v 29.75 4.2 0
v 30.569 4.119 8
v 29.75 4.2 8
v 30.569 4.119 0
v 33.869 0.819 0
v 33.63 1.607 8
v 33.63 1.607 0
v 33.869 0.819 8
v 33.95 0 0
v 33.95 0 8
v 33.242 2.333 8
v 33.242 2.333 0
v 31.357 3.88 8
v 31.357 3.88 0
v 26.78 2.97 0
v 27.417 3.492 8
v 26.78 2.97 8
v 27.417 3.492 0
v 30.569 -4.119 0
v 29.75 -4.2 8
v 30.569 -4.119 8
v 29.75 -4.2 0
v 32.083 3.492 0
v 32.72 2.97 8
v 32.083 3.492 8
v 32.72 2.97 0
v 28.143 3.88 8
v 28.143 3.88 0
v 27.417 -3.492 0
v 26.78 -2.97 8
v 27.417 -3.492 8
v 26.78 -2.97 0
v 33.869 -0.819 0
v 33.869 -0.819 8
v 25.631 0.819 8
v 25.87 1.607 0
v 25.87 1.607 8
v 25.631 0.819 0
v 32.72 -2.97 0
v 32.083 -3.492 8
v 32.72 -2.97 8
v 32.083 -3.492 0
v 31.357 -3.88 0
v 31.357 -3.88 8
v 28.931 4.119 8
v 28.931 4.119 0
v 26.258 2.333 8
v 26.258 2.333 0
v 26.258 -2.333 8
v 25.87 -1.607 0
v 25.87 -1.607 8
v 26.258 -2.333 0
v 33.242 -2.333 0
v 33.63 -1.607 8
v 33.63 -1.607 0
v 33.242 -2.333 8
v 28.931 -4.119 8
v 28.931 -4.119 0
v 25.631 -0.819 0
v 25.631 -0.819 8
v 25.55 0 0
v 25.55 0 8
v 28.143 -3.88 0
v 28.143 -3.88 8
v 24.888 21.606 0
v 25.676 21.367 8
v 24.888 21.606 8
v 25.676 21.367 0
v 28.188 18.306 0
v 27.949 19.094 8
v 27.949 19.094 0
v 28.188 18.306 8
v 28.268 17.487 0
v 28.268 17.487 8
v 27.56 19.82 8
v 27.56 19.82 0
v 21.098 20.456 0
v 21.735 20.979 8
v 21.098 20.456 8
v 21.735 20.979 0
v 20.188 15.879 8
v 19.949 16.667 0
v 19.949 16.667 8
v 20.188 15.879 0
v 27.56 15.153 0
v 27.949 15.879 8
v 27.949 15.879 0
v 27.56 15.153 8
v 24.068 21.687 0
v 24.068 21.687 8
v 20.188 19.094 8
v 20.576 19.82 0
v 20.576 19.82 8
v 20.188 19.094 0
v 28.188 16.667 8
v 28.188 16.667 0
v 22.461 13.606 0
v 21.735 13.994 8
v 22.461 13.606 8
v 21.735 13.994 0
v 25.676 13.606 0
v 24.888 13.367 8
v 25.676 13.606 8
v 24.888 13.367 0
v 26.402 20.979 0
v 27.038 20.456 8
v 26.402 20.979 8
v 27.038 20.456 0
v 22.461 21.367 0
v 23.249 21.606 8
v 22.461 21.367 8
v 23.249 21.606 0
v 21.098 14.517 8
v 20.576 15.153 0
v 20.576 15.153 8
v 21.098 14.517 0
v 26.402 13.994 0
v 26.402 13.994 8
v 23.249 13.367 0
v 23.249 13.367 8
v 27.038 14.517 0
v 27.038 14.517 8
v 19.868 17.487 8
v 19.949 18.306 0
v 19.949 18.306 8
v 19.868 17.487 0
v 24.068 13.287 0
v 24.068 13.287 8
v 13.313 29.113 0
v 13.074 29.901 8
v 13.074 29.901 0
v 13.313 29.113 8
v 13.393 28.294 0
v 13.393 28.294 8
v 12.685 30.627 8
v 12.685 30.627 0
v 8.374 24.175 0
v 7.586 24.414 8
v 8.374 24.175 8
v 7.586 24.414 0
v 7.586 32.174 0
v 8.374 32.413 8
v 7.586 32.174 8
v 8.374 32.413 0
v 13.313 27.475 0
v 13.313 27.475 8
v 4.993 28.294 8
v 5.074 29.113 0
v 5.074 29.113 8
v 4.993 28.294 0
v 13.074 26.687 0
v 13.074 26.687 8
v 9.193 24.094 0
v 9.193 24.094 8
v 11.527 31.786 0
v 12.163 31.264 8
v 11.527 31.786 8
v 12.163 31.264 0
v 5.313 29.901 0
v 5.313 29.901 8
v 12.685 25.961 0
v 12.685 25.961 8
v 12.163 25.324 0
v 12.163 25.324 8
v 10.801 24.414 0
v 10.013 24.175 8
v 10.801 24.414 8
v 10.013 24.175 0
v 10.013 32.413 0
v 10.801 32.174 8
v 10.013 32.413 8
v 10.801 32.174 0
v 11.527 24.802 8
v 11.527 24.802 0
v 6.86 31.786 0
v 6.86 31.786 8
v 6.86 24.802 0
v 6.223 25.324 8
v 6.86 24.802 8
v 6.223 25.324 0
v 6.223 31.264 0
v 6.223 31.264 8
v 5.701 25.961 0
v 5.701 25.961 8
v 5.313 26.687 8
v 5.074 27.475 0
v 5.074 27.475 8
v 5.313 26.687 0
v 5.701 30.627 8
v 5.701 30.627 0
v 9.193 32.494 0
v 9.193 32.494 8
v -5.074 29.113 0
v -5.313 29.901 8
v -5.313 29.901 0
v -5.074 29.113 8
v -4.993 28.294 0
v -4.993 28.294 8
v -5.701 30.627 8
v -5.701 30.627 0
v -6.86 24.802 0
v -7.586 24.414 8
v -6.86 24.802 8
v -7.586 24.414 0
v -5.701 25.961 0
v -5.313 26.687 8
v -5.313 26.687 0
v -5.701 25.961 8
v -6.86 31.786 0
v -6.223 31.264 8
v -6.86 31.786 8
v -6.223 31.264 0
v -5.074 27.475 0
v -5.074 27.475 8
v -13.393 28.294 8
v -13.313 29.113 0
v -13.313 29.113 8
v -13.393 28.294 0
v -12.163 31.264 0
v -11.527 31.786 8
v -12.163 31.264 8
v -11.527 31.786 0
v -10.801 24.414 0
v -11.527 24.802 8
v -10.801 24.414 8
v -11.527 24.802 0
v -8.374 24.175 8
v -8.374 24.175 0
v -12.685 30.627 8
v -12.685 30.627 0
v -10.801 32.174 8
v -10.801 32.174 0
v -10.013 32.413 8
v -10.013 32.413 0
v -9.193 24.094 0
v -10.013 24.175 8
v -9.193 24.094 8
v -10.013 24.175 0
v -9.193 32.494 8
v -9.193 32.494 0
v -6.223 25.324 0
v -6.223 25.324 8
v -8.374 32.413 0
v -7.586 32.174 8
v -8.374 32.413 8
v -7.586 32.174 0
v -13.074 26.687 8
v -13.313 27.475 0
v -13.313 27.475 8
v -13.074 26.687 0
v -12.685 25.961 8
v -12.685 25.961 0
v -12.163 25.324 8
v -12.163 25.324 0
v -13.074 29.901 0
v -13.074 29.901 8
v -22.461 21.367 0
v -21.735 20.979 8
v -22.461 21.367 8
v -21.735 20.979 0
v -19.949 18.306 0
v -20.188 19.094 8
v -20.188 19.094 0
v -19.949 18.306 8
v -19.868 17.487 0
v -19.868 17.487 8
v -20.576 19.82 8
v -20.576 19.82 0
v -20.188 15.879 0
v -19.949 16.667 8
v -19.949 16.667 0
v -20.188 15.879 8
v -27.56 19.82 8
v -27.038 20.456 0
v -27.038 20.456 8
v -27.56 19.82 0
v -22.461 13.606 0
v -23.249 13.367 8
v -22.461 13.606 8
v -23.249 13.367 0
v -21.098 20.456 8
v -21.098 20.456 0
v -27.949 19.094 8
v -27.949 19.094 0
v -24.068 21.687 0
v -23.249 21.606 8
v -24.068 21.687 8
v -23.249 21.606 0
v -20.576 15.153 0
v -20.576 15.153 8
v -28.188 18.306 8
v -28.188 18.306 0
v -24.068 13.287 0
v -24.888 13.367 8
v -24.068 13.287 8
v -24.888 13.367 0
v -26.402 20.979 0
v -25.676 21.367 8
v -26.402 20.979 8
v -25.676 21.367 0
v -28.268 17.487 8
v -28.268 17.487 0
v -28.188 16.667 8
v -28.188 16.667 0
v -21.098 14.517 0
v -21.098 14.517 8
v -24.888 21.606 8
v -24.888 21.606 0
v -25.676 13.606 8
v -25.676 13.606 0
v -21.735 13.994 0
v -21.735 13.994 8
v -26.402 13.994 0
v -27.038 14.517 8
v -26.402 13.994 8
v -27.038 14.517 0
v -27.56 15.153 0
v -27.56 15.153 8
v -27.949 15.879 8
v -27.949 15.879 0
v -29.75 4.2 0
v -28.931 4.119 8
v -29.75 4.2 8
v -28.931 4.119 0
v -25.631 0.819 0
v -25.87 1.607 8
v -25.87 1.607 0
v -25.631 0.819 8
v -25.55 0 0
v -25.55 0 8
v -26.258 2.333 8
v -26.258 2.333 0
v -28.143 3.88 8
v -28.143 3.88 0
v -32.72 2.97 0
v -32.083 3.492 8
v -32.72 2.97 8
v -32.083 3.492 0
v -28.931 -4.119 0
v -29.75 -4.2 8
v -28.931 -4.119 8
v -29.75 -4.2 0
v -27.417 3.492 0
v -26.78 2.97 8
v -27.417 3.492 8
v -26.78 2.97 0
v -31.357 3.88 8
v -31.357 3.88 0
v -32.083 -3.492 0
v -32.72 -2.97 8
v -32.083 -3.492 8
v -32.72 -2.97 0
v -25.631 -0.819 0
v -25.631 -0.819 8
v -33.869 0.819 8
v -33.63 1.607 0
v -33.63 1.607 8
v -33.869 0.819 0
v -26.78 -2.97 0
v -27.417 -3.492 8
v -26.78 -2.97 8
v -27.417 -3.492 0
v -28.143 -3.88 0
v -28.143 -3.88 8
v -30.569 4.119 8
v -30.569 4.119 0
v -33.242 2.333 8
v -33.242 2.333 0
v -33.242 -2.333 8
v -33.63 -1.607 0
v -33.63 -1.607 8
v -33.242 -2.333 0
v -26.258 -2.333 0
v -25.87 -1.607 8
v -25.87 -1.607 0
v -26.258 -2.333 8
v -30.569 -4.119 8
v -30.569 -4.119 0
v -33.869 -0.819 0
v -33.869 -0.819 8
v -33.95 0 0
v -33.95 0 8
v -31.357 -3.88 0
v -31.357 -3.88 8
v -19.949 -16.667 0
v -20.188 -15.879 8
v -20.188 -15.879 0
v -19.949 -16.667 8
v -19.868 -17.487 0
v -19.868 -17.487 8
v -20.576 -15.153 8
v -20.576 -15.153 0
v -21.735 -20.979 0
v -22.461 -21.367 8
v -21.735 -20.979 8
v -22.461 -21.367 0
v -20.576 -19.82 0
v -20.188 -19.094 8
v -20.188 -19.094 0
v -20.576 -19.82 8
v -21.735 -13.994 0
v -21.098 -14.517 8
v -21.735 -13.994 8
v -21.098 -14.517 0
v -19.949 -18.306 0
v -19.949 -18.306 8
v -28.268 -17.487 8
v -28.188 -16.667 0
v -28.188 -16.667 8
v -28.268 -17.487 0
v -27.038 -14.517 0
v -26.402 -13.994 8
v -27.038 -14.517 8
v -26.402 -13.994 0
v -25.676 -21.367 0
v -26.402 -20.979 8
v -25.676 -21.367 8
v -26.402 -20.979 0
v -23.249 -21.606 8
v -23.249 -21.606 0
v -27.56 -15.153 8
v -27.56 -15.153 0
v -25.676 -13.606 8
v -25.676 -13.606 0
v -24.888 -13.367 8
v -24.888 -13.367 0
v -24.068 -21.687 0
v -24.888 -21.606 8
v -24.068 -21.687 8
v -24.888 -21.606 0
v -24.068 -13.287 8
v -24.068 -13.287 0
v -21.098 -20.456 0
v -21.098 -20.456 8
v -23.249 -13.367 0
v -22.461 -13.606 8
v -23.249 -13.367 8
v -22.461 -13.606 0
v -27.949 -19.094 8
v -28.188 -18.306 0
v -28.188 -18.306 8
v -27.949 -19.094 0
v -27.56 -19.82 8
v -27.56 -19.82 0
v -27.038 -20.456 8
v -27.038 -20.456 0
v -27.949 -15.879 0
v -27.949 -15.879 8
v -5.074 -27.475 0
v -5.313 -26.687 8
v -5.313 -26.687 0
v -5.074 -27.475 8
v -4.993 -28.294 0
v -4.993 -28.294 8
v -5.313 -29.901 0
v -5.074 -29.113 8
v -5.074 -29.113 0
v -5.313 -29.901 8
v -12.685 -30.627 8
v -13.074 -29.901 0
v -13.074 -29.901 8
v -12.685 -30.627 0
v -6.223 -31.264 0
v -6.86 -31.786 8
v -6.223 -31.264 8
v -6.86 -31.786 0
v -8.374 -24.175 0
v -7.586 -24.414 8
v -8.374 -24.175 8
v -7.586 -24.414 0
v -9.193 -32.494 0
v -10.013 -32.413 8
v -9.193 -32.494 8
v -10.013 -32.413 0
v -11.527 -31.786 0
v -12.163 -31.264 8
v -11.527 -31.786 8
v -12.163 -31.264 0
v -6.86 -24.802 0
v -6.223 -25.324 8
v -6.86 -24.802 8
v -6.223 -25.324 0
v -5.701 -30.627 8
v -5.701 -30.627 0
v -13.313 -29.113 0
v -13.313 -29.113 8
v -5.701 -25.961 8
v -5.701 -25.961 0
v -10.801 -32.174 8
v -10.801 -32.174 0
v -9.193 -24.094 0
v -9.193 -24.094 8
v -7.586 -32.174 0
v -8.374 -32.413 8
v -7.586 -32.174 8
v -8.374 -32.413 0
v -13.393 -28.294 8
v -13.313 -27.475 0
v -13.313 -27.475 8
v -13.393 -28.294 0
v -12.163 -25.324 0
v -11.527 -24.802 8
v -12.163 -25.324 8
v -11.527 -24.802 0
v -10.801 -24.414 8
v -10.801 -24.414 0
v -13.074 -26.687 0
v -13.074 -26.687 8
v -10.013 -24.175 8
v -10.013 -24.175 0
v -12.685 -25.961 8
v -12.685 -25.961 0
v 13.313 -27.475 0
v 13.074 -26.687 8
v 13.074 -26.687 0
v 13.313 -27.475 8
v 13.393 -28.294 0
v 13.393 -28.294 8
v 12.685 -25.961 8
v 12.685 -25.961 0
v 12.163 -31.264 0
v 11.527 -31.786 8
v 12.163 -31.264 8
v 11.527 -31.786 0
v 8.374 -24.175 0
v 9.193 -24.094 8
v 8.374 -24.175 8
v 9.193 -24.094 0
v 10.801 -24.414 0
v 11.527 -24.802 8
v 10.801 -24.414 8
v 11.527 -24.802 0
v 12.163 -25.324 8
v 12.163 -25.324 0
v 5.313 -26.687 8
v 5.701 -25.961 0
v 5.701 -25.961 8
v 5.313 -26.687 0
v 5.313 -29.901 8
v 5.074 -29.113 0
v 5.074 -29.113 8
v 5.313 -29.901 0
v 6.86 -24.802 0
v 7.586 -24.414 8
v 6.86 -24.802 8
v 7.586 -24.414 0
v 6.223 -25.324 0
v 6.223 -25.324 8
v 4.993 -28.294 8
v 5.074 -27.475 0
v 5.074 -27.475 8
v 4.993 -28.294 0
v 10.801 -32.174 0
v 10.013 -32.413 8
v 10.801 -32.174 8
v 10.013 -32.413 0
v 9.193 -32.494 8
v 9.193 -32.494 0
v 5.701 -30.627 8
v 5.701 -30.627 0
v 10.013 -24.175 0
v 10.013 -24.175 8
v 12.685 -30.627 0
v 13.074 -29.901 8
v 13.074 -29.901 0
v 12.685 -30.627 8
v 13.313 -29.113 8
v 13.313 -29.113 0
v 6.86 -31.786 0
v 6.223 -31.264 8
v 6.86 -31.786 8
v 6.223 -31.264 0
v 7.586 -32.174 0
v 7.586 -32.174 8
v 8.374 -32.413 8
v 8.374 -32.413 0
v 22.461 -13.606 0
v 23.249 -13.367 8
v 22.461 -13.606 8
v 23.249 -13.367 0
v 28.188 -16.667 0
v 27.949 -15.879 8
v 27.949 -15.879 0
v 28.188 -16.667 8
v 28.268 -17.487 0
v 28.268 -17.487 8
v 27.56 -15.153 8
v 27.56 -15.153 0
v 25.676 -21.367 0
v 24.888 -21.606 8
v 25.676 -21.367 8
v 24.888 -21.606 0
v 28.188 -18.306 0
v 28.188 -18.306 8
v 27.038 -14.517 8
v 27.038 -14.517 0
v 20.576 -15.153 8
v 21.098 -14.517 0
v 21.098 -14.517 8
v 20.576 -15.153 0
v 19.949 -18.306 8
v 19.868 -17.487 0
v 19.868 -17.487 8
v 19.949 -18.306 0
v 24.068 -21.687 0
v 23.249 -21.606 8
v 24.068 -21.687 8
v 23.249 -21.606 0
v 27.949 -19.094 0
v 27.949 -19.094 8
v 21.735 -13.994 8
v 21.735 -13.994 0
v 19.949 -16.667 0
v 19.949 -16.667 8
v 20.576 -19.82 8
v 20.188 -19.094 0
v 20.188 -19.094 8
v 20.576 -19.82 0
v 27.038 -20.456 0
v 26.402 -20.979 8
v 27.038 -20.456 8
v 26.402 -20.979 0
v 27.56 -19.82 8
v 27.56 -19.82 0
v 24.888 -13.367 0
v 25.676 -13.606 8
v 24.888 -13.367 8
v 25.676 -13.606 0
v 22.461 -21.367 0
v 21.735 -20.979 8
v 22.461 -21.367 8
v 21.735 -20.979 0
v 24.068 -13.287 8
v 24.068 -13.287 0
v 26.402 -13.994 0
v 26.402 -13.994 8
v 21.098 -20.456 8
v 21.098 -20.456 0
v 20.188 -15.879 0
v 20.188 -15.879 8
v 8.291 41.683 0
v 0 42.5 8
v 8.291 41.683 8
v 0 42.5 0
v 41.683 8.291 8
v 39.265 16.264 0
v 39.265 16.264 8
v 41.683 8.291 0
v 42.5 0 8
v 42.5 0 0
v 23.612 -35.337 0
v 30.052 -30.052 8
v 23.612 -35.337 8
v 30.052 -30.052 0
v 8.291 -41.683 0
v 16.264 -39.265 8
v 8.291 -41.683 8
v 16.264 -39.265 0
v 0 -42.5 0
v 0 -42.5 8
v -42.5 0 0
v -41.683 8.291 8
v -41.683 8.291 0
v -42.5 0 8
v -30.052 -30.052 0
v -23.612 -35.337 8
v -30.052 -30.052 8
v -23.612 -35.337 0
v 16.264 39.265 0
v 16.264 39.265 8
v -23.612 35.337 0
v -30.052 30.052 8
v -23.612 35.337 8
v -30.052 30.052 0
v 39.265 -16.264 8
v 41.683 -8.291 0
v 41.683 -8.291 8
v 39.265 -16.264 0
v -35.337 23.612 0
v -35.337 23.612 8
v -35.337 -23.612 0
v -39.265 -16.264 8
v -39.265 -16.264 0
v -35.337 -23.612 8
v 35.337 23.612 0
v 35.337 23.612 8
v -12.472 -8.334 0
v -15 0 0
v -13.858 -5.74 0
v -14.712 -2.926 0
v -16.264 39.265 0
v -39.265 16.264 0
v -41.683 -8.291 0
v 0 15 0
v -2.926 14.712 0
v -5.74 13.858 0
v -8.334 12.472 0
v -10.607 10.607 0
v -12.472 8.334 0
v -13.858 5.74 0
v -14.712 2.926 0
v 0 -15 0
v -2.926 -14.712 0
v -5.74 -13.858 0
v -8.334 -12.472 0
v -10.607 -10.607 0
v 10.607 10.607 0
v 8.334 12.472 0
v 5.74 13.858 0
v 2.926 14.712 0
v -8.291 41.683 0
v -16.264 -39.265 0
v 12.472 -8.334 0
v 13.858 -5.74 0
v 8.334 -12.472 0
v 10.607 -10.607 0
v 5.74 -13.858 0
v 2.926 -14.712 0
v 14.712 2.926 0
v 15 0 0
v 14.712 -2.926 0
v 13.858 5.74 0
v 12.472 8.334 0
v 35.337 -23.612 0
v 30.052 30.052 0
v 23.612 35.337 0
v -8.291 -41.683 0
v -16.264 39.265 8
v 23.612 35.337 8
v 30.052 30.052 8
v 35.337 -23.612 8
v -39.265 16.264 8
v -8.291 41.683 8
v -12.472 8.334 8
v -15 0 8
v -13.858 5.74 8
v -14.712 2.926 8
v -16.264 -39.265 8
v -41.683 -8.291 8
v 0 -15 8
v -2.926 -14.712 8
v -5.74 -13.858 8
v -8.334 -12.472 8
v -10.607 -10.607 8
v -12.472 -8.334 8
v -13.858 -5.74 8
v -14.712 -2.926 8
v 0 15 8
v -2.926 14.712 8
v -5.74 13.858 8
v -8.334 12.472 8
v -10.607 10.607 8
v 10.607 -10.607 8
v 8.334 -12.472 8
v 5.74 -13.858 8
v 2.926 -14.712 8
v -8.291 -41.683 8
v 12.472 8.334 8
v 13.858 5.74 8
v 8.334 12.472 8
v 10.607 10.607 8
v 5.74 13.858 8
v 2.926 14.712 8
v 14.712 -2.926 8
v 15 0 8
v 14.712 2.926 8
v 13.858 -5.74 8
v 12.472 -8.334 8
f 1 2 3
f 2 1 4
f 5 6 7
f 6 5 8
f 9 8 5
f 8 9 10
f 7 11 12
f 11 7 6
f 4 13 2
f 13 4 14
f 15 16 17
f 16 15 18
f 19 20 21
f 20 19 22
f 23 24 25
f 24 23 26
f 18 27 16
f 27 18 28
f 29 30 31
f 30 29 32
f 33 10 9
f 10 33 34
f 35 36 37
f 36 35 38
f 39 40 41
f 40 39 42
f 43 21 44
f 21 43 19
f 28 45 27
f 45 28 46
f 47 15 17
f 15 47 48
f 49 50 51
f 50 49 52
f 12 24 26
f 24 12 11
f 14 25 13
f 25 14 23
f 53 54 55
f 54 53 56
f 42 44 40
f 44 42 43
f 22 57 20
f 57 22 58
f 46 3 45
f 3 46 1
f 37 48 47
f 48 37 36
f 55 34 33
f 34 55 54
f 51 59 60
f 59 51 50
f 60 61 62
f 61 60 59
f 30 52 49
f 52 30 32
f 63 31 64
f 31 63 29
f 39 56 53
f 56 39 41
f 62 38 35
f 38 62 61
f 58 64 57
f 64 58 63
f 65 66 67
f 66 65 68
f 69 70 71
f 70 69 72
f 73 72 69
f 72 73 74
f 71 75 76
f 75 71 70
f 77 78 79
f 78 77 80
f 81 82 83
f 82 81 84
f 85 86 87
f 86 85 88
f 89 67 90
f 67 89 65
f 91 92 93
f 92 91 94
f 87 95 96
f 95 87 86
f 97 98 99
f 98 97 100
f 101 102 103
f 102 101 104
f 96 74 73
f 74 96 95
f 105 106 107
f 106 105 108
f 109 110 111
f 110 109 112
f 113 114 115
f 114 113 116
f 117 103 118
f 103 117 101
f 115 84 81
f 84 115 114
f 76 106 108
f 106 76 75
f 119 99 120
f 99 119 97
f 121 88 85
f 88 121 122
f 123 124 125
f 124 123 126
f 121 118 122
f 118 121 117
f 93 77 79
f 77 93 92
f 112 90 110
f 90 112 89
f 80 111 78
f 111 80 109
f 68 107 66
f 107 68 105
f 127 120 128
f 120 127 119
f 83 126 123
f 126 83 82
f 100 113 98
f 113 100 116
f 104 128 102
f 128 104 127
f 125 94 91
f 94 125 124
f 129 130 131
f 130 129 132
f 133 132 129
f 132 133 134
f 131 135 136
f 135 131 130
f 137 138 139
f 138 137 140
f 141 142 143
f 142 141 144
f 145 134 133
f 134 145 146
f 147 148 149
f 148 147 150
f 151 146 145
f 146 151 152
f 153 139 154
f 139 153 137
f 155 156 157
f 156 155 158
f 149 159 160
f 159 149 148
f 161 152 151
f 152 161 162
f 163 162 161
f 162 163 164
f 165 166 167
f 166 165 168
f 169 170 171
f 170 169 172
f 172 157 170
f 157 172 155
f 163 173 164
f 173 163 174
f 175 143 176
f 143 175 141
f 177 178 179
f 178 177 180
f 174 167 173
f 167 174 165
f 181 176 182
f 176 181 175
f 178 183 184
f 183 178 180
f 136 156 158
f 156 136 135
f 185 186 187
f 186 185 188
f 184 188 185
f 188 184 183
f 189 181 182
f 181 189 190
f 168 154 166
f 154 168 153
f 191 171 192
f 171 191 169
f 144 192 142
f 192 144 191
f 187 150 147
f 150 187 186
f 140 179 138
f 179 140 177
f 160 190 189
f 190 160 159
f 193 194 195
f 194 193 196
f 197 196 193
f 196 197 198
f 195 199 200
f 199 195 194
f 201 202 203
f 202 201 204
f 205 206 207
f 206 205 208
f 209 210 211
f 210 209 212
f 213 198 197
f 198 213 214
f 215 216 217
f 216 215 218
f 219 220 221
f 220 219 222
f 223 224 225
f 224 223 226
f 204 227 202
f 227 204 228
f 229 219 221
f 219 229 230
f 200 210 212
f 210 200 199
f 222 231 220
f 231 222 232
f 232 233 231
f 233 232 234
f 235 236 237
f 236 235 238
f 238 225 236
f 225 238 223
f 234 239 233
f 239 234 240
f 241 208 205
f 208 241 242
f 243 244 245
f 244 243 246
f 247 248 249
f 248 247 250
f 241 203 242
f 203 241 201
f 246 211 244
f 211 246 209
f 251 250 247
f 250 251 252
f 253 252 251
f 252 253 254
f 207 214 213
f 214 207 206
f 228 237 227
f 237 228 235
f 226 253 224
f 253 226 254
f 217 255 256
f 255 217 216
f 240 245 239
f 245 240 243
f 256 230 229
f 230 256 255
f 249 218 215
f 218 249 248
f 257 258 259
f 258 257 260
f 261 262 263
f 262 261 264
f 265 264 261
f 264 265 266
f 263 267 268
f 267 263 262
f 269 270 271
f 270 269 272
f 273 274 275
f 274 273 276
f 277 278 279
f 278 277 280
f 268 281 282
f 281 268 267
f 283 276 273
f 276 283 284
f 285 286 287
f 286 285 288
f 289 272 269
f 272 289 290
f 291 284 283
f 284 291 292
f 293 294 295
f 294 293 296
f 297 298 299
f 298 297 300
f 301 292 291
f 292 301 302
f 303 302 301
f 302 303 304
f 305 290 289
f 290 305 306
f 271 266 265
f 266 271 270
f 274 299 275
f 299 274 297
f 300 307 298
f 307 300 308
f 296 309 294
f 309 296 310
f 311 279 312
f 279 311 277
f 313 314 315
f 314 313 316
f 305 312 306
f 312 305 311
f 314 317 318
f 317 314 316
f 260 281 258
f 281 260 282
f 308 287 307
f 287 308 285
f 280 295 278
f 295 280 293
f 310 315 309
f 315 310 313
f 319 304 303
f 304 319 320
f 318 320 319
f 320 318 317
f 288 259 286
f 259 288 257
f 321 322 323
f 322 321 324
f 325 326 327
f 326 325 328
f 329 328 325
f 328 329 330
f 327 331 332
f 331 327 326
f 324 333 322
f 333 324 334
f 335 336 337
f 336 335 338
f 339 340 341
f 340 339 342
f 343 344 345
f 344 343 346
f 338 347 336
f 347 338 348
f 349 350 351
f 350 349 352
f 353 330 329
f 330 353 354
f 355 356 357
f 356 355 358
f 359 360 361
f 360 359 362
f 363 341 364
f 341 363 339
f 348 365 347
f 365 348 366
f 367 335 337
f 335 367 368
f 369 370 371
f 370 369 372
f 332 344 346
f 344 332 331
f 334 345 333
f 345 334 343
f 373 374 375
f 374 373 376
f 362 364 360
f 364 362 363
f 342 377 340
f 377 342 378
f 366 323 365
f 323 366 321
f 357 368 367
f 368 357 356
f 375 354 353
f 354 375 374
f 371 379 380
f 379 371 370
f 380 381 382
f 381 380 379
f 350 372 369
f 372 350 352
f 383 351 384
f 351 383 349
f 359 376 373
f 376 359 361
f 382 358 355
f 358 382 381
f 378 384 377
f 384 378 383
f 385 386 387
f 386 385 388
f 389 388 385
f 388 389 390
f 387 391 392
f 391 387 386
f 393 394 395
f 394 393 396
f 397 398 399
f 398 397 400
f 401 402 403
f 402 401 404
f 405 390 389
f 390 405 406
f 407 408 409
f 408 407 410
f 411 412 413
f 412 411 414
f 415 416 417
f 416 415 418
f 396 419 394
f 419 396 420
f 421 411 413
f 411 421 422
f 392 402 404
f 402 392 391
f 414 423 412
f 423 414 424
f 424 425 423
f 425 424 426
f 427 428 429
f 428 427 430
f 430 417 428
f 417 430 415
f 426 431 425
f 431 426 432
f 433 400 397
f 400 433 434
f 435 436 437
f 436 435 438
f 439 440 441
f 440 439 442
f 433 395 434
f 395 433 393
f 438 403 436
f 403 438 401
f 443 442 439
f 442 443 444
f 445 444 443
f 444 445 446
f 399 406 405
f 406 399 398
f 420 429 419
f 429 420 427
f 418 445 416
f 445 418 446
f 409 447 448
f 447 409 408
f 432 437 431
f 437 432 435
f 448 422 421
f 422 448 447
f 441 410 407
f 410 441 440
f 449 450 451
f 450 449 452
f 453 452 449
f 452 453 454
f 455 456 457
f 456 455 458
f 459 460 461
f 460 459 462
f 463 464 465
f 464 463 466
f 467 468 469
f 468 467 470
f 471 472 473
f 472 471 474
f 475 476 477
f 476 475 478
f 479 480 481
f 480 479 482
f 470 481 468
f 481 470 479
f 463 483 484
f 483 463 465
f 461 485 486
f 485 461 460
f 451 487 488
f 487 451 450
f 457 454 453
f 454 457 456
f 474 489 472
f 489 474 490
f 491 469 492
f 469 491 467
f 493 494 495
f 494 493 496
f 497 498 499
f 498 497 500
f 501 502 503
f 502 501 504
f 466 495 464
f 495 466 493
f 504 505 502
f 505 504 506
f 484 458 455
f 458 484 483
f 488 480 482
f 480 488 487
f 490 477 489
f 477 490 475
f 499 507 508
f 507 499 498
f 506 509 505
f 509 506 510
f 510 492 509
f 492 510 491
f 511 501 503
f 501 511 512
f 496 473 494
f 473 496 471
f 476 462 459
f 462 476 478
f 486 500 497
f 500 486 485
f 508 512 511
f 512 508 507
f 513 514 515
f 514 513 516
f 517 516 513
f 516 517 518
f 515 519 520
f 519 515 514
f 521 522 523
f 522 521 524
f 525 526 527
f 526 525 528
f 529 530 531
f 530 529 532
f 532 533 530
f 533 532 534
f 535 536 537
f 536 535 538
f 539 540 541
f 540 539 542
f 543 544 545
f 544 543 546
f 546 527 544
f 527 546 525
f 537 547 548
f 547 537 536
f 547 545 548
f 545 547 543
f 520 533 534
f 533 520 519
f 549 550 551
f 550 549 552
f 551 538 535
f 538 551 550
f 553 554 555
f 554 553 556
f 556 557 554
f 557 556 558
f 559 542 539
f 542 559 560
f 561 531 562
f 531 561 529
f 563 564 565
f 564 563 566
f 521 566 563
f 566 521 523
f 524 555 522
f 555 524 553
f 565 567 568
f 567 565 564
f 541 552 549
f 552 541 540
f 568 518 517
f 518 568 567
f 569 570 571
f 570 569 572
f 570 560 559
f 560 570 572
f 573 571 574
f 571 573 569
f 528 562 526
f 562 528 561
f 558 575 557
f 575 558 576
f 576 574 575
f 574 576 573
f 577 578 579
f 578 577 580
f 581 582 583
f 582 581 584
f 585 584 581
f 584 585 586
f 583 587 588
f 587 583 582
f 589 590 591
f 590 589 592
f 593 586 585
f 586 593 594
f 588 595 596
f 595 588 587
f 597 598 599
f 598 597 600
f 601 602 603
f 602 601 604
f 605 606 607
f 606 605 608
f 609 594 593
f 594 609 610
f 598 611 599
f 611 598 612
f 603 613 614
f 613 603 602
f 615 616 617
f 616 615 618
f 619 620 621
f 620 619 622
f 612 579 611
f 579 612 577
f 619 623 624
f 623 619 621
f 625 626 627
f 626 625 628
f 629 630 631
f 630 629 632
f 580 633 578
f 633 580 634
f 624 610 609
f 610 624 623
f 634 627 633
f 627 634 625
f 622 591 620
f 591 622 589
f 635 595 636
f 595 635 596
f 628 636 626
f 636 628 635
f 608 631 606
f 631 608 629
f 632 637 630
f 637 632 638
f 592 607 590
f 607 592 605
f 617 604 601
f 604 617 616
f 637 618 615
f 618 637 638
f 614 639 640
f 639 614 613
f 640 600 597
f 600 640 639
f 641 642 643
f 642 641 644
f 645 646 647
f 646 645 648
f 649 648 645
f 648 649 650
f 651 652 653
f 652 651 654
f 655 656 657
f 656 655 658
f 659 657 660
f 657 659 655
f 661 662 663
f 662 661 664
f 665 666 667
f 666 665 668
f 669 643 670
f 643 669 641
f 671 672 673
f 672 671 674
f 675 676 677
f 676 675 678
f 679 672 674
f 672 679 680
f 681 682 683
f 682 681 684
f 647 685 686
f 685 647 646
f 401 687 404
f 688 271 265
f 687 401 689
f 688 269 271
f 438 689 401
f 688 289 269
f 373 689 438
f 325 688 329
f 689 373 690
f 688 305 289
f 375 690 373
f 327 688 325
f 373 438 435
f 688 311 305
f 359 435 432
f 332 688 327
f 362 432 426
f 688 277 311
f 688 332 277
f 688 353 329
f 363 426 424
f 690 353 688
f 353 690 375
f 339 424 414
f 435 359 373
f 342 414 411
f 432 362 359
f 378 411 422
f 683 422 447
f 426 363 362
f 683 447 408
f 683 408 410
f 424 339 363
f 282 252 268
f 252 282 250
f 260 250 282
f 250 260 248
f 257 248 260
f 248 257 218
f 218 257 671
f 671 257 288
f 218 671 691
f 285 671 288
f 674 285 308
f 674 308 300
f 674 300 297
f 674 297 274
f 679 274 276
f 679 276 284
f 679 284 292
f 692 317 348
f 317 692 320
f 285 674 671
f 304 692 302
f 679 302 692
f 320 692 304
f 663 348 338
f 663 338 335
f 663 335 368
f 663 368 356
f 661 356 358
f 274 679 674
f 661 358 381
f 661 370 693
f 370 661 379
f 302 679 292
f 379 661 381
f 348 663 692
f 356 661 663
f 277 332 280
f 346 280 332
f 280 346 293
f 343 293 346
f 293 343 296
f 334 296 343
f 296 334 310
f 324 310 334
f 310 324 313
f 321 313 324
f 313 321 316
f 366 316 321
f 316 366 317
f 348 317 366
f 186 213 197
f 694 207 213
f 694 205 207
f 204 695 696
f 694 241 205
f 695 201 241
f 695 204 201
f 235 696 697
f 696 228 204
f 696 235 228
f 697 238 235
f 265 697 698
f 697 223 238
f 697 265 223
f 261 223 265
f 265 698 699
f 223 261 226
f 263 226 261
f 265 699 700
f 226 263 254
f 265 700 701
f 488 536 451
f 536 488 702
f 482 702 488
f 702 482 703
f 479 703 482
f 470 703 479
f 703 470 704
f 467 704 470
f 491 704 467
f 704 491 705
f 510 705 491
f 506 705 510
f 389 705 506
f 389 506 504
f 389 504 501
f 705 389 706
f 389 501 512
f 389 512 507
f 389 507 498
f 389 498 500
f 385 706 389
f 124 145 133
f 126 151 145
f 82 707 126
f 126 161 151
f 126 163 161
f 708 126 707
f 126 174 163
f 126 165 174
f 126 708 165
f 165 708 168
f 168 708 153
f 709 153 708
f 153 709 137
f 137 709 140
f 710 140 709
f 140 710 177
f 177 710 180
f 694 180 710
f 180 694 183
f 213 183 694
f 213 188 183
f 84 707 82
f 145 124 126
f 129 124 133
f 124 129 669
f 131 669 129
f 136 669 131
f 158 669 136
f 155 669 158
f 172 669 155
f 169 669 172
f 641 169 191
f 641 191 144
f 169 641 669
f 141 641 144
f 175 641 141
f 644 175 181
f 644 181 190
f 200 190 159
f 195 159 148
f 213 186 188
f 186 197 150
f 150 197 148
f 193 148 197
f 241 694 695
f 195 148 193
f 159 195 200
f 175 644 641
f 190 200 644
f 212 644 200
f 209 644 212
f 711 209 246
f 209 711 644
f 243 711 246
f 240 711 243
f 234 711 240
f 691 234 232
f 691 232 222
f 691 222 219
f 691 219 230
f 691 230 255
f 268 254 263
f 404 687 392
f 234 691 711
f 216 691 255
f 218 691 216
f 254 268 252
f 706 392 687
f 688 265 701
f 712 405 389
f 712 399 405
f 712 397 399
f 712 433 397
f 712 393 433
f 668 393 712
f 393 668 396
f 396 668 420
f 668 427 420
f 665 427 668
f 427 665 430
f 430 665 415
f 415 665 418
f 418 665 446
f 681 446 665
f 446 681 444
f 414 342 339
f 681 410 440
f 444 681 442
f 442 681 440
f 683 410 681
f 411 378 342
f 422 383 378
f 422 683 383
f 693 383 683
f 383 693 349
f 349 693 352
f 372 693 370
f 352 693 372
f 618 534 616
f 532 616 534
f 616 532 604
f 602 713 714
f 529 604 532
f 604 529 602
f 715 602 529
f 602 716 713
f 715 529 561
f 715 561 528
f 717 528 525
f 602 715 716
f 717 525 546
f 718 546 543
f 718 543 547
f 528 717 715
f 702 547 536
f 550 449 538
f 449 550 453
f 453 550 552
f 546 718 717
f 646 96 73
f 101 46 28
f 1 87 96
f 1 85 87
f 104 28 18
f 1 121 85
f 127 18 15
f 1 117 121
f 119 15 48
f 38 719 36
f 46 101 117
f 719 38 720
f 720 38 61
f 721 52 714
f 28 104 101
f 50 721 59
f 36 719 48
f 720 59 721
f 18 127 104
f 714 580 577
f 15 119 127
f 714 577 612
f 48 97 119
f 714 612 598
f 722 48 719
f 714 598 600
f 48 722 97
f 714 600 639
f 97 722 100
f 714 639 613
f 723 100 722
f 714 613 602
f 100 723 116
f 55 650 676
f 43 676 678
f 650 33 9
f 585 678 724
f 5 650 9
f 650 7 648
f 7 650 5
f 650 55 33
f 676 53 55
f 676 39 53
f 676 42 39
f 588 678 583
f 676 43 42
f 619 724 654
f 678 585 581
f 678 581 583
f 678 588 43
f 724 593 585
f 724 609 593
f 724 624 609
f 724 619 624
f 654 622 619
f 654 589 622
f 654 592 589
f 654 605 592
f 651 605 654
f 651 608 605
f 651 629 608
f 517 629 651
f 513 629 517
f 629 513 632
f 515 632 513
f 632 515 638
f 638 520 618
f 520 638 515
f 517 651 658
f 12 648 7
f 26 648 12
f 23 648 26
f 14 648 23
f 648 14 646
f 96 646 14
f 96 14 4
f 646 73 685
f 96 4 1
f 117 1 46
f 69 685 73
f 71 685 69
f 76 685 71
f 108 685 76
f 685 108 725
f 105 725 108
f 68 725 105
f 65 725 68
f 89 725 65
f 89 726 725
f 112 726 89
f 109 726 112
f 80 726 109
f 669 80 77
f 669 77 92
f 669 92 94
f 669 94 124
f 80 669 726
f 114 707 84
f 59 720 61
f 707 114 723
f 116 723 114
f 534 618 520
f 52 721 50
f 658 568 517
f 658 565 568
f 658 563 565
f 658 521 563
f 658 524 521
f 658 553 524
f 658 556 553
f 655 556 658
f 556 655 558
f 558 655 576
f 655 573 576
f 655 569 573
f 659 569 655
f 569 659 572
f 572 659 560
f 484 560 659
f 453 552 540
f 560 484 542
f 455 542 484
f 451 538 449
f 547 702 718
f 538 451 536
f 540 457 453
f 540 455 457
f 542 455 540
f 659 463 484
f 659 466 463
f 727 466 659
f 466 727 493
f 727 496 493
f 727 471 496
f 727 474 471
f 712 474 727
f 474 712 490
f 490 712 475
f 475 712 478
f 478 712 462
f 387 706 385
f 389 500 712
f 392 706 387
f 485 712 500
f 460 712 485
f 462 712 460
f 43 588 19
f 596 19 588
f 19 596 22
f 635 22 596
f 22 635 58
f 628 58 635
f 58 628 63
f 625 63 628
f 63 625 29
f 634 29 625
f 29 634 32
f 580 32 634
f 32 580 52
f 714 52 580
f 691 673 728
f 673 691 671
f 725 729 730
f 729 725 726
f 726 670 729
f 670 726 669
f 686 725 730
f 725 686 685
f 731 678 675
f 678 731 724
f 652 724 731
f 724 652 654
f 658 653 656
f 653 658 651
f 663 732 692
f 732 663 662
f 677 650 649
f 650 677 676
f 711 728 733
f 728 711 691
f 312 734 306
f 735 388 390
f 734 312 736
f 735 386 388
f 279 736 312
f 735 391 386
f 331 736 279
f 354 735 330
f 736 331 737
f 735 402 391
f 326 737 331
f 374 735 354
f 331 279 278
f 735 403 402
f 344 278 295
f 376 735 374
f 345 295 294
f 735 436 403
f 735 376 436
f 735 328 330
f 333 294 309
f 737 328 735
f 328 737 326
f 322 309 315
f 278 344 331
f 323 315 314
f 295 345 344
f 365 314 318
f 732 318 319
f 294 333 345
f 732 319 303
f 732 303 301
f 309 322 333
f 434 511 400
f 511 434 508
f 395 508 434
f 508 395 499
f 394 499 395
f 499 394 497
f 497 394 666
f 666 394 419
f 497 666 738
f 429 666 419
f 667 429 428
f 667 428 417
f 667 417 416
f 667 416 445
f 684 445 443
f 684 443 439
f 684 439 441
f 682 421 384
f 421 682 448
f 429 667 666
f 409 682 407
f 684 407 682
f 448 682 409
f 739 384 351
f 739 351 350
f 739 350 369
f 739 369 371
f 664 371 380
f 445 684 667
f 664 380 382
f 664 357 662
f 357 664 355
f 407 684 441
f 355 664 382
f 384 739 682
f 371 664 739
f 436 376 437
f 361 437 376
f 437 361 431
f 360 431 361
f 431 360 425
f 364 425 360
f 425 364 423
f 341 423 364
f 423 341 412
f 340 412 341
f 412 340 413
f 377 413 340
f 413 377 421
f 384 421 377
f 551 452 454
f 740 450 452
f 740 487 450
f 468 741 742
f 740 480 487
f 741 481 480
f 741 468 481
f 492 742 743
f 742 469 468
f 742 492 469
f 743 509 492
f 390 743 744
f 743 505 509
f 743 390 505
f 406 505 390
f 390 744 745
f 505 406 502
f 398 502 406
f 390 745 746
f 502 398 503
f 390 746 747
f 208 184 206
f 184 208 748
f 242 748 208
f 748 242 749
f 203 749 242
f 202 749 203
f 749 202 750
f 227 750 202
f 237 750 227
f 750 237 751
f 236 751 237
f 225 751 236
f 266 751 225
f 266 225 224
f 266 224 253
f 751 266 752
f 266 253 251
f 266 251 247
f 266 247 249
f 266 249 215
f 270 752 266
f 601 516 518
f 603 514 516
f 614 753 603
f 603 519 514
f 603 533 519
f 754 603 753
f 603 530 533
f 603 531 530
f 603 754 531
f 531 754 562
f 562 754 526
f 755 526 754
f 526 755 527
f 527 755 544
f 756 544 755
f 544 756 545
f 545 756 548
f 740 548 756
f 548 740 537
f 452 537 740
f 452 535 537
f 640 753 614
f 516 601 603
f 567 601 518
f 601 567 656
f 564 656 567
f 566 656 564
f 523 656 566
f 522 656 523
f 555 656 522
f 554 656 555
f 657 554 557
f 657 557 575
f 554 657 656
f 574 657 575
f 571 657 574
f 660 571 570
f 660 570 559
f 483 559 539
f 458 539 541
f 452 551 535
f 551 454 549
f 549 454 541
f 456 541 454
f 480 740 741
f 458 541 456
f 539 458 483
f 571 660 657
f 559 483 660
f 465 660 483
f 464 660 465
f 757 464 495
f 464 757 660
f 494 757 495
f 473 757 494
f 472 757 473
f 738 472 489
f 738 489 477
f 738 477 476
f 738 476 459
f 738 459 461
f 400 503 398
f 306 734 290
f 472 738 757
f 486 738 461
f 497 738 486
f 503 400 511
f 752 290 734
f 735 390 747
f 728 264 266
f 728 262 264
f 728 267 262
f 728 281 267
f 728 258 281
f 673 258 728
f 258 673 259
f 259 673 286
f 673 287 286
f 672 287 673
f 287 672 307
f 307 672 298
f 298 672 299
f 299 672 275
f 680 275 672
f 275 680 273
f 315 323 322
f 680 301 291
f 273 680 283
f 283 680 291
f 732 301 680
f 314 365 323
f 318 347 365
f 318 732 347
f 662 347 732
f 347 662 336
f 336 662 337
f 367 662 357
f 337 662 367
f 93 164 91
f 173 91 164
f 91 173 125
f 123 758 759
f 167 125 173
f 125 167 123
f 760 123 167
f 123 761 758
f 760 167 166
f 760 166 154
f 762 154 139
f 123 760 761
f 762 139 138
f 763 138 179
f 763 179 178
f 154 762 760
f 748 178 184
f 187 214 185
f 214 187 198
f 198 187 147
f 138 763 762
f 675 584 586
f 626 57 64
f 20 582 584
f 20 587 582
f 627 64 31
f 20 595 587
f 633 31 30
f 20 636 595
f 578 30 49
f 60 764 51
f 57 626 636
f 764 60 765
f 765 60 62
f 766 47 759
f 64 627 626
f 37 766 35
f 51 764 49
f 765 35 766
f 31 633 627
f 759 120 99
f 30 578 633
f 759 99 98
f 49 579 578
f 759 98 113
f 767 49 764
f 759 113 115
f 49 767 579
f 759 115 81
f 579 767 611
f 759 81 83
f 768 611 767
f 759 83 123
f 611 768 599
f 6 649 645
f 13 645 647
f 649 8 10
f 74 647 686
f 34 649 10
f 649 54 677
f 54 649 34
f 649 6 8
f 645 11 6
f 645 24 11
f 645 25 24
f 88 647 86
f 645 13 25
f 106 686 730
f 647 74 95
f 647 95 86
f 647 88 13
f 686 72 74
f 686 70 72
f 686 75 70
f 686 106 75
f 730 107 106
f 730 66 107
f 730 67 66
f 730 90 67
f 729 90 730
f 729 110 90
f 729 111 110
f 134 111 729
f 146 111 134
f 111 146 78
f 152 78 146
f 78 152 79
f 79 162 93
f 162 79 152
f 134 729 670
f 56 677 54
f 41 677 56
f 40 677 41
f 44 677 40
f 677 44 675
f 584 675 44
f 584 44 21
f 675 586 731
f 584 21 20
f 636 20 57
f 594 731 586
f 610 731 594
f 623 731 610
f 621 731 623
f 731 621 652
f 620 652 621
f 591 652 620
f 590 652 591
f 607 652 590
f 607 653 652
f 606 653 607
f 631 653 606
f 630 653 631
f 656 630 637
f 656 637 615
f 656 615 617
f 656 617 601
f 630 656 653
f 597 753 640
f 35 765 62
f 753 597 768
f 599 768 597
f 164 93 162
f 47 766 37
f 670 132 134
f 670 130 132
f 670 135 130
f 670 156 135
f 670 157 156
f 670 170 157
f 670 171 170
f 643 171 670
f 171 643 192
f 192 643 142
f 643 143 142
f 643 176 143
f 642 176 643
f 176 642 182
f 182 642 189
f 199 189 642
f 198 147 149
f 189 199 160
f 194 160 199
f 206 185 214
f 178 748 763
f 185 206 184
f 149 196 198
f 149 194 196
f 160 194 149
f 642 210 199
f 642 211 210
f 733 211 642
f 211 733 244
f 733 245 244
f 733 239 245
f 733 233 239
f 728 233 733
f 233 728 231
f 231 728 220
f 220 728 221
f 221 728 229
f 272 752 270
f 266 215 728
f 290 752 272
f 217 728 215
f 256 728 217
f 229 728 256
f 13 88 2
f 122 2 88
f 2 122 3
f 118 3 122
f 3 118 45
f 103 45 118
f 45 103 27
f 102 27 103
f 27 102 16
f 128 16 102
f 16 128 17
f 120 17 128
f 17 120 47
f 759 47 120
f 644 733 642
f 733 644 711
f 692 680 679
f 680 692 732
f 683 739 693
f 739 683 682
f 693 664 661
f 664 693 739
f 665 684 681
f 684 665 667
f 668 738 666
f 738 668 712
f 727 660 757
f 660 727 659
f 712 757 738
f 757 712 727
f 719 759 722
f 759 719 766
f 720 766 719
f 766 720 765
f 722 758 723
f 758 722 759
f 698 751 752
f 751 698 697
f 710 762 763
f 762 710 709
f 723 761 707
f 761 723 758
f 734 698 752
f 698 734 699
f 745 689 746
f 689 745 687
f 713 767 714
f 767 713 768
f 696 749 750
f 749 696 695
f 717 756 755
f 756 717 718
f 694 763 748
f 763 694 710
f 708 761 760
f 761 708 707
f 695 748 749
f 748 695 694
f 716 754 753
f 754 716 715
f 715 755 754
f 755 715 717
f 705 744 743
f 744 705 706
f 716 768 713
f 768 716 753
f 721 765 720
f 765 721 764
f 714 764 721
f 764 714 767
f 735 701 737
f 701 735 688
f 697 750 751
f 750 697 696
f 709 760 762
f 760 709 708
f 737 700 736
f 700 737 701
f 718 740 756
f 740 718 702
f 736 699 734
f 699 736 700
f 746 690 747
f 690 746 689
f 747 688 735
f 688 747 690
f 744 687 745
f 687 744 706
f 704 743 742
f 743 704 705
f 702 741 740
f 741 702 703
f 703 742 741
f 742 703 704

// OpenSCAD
$fn = 32;

// ----------------------------------------------------------------------
// Flange Ø85 x 8
// 10 holes on a Ø59.5 bolt circle, bolted joints
// ----------------------------------------------------------------------

// --- parameters (mm) ---
flange_d = 85;  // outside diameter of the flange
thickness = 8;  // flange thickness
holes = 10;     // number of bolt holes
pcd = 59.5;     // bolt circle diameter
start_deg = 0;  // angle of the first hole, from +X
hole_d = 8.4;   // bolt hole diameter
bore_d = 30;    // central through bore
hub_d = 42;     // hub outside diameter
hub_h = 0;      // hub height above the flange face (0 = no hub)

// --- derived feature positions (mm) ---
height = thickness + hub_h;  // = 8   overall height of the part
pcd_r = pcd / 2;             // = 29.75   bolt circle radius
hole_step = 360 / holes;     // = 36   angular pitch
feature_centers = [
  [pcd_r * cos(start_deg + 0 * hole_step), pcd_r * sin(start_deg + 0 * hole_step)],
  [pcd_r * cos(start_deg + 1 * hole_step), pcd_r * sin(start_deg + 1 * hole_step)],
  [pcd_r * cos(start_deg + 2 * hole_step), pcd_r * sin(start_deg + 2 * hole_step)],
  [pcd_r * cos(start_deg + 3 * hole_step), pcd_r * sin(start_deg + 3 * hole_step)],
  [pcd_r * cos(start_deg + 4 * hole_step), pcd_r * sin(start_deg + 4 * hole_step)],
  [pcd_r * cos(start_deg + 5 * hole_step), pcd_r * sin(start_deg + 5 * hole_step)],
  [pcd_r * cos(start_deg + 6 * hole_step), pcd_r * sin(start_deg + 6 * hole_step)],
  [pcd_r * cos(start_deg + 7 * hole_step), pcd_r * sin(start_deg + 7 * hole_step)],
  [pcd_r * cos(start_deg + 8 * hole_step), pcd_r * sin(start_deg + 8 * hole_step)],
  [pcd_r * cos(start_deg + 9 * hole_step), pcd_r * sin(start_deg + 9 * hole_step)]
];   // bolt hole centres on the pitch circle

// flange disc, every hole and the bore cut straight through
difference() {
  union() {
    cylinder(d = flange_d, h = thickness);
  }
  translate([0, 0, -1]) cylinder(d = bore_d, h = height + 2);  // bore, through
  for (centre = feature_centers)
    translate([centre[0], centre[1], -1]) cylinder(d = hole_d, h = thickness + 2);
}
